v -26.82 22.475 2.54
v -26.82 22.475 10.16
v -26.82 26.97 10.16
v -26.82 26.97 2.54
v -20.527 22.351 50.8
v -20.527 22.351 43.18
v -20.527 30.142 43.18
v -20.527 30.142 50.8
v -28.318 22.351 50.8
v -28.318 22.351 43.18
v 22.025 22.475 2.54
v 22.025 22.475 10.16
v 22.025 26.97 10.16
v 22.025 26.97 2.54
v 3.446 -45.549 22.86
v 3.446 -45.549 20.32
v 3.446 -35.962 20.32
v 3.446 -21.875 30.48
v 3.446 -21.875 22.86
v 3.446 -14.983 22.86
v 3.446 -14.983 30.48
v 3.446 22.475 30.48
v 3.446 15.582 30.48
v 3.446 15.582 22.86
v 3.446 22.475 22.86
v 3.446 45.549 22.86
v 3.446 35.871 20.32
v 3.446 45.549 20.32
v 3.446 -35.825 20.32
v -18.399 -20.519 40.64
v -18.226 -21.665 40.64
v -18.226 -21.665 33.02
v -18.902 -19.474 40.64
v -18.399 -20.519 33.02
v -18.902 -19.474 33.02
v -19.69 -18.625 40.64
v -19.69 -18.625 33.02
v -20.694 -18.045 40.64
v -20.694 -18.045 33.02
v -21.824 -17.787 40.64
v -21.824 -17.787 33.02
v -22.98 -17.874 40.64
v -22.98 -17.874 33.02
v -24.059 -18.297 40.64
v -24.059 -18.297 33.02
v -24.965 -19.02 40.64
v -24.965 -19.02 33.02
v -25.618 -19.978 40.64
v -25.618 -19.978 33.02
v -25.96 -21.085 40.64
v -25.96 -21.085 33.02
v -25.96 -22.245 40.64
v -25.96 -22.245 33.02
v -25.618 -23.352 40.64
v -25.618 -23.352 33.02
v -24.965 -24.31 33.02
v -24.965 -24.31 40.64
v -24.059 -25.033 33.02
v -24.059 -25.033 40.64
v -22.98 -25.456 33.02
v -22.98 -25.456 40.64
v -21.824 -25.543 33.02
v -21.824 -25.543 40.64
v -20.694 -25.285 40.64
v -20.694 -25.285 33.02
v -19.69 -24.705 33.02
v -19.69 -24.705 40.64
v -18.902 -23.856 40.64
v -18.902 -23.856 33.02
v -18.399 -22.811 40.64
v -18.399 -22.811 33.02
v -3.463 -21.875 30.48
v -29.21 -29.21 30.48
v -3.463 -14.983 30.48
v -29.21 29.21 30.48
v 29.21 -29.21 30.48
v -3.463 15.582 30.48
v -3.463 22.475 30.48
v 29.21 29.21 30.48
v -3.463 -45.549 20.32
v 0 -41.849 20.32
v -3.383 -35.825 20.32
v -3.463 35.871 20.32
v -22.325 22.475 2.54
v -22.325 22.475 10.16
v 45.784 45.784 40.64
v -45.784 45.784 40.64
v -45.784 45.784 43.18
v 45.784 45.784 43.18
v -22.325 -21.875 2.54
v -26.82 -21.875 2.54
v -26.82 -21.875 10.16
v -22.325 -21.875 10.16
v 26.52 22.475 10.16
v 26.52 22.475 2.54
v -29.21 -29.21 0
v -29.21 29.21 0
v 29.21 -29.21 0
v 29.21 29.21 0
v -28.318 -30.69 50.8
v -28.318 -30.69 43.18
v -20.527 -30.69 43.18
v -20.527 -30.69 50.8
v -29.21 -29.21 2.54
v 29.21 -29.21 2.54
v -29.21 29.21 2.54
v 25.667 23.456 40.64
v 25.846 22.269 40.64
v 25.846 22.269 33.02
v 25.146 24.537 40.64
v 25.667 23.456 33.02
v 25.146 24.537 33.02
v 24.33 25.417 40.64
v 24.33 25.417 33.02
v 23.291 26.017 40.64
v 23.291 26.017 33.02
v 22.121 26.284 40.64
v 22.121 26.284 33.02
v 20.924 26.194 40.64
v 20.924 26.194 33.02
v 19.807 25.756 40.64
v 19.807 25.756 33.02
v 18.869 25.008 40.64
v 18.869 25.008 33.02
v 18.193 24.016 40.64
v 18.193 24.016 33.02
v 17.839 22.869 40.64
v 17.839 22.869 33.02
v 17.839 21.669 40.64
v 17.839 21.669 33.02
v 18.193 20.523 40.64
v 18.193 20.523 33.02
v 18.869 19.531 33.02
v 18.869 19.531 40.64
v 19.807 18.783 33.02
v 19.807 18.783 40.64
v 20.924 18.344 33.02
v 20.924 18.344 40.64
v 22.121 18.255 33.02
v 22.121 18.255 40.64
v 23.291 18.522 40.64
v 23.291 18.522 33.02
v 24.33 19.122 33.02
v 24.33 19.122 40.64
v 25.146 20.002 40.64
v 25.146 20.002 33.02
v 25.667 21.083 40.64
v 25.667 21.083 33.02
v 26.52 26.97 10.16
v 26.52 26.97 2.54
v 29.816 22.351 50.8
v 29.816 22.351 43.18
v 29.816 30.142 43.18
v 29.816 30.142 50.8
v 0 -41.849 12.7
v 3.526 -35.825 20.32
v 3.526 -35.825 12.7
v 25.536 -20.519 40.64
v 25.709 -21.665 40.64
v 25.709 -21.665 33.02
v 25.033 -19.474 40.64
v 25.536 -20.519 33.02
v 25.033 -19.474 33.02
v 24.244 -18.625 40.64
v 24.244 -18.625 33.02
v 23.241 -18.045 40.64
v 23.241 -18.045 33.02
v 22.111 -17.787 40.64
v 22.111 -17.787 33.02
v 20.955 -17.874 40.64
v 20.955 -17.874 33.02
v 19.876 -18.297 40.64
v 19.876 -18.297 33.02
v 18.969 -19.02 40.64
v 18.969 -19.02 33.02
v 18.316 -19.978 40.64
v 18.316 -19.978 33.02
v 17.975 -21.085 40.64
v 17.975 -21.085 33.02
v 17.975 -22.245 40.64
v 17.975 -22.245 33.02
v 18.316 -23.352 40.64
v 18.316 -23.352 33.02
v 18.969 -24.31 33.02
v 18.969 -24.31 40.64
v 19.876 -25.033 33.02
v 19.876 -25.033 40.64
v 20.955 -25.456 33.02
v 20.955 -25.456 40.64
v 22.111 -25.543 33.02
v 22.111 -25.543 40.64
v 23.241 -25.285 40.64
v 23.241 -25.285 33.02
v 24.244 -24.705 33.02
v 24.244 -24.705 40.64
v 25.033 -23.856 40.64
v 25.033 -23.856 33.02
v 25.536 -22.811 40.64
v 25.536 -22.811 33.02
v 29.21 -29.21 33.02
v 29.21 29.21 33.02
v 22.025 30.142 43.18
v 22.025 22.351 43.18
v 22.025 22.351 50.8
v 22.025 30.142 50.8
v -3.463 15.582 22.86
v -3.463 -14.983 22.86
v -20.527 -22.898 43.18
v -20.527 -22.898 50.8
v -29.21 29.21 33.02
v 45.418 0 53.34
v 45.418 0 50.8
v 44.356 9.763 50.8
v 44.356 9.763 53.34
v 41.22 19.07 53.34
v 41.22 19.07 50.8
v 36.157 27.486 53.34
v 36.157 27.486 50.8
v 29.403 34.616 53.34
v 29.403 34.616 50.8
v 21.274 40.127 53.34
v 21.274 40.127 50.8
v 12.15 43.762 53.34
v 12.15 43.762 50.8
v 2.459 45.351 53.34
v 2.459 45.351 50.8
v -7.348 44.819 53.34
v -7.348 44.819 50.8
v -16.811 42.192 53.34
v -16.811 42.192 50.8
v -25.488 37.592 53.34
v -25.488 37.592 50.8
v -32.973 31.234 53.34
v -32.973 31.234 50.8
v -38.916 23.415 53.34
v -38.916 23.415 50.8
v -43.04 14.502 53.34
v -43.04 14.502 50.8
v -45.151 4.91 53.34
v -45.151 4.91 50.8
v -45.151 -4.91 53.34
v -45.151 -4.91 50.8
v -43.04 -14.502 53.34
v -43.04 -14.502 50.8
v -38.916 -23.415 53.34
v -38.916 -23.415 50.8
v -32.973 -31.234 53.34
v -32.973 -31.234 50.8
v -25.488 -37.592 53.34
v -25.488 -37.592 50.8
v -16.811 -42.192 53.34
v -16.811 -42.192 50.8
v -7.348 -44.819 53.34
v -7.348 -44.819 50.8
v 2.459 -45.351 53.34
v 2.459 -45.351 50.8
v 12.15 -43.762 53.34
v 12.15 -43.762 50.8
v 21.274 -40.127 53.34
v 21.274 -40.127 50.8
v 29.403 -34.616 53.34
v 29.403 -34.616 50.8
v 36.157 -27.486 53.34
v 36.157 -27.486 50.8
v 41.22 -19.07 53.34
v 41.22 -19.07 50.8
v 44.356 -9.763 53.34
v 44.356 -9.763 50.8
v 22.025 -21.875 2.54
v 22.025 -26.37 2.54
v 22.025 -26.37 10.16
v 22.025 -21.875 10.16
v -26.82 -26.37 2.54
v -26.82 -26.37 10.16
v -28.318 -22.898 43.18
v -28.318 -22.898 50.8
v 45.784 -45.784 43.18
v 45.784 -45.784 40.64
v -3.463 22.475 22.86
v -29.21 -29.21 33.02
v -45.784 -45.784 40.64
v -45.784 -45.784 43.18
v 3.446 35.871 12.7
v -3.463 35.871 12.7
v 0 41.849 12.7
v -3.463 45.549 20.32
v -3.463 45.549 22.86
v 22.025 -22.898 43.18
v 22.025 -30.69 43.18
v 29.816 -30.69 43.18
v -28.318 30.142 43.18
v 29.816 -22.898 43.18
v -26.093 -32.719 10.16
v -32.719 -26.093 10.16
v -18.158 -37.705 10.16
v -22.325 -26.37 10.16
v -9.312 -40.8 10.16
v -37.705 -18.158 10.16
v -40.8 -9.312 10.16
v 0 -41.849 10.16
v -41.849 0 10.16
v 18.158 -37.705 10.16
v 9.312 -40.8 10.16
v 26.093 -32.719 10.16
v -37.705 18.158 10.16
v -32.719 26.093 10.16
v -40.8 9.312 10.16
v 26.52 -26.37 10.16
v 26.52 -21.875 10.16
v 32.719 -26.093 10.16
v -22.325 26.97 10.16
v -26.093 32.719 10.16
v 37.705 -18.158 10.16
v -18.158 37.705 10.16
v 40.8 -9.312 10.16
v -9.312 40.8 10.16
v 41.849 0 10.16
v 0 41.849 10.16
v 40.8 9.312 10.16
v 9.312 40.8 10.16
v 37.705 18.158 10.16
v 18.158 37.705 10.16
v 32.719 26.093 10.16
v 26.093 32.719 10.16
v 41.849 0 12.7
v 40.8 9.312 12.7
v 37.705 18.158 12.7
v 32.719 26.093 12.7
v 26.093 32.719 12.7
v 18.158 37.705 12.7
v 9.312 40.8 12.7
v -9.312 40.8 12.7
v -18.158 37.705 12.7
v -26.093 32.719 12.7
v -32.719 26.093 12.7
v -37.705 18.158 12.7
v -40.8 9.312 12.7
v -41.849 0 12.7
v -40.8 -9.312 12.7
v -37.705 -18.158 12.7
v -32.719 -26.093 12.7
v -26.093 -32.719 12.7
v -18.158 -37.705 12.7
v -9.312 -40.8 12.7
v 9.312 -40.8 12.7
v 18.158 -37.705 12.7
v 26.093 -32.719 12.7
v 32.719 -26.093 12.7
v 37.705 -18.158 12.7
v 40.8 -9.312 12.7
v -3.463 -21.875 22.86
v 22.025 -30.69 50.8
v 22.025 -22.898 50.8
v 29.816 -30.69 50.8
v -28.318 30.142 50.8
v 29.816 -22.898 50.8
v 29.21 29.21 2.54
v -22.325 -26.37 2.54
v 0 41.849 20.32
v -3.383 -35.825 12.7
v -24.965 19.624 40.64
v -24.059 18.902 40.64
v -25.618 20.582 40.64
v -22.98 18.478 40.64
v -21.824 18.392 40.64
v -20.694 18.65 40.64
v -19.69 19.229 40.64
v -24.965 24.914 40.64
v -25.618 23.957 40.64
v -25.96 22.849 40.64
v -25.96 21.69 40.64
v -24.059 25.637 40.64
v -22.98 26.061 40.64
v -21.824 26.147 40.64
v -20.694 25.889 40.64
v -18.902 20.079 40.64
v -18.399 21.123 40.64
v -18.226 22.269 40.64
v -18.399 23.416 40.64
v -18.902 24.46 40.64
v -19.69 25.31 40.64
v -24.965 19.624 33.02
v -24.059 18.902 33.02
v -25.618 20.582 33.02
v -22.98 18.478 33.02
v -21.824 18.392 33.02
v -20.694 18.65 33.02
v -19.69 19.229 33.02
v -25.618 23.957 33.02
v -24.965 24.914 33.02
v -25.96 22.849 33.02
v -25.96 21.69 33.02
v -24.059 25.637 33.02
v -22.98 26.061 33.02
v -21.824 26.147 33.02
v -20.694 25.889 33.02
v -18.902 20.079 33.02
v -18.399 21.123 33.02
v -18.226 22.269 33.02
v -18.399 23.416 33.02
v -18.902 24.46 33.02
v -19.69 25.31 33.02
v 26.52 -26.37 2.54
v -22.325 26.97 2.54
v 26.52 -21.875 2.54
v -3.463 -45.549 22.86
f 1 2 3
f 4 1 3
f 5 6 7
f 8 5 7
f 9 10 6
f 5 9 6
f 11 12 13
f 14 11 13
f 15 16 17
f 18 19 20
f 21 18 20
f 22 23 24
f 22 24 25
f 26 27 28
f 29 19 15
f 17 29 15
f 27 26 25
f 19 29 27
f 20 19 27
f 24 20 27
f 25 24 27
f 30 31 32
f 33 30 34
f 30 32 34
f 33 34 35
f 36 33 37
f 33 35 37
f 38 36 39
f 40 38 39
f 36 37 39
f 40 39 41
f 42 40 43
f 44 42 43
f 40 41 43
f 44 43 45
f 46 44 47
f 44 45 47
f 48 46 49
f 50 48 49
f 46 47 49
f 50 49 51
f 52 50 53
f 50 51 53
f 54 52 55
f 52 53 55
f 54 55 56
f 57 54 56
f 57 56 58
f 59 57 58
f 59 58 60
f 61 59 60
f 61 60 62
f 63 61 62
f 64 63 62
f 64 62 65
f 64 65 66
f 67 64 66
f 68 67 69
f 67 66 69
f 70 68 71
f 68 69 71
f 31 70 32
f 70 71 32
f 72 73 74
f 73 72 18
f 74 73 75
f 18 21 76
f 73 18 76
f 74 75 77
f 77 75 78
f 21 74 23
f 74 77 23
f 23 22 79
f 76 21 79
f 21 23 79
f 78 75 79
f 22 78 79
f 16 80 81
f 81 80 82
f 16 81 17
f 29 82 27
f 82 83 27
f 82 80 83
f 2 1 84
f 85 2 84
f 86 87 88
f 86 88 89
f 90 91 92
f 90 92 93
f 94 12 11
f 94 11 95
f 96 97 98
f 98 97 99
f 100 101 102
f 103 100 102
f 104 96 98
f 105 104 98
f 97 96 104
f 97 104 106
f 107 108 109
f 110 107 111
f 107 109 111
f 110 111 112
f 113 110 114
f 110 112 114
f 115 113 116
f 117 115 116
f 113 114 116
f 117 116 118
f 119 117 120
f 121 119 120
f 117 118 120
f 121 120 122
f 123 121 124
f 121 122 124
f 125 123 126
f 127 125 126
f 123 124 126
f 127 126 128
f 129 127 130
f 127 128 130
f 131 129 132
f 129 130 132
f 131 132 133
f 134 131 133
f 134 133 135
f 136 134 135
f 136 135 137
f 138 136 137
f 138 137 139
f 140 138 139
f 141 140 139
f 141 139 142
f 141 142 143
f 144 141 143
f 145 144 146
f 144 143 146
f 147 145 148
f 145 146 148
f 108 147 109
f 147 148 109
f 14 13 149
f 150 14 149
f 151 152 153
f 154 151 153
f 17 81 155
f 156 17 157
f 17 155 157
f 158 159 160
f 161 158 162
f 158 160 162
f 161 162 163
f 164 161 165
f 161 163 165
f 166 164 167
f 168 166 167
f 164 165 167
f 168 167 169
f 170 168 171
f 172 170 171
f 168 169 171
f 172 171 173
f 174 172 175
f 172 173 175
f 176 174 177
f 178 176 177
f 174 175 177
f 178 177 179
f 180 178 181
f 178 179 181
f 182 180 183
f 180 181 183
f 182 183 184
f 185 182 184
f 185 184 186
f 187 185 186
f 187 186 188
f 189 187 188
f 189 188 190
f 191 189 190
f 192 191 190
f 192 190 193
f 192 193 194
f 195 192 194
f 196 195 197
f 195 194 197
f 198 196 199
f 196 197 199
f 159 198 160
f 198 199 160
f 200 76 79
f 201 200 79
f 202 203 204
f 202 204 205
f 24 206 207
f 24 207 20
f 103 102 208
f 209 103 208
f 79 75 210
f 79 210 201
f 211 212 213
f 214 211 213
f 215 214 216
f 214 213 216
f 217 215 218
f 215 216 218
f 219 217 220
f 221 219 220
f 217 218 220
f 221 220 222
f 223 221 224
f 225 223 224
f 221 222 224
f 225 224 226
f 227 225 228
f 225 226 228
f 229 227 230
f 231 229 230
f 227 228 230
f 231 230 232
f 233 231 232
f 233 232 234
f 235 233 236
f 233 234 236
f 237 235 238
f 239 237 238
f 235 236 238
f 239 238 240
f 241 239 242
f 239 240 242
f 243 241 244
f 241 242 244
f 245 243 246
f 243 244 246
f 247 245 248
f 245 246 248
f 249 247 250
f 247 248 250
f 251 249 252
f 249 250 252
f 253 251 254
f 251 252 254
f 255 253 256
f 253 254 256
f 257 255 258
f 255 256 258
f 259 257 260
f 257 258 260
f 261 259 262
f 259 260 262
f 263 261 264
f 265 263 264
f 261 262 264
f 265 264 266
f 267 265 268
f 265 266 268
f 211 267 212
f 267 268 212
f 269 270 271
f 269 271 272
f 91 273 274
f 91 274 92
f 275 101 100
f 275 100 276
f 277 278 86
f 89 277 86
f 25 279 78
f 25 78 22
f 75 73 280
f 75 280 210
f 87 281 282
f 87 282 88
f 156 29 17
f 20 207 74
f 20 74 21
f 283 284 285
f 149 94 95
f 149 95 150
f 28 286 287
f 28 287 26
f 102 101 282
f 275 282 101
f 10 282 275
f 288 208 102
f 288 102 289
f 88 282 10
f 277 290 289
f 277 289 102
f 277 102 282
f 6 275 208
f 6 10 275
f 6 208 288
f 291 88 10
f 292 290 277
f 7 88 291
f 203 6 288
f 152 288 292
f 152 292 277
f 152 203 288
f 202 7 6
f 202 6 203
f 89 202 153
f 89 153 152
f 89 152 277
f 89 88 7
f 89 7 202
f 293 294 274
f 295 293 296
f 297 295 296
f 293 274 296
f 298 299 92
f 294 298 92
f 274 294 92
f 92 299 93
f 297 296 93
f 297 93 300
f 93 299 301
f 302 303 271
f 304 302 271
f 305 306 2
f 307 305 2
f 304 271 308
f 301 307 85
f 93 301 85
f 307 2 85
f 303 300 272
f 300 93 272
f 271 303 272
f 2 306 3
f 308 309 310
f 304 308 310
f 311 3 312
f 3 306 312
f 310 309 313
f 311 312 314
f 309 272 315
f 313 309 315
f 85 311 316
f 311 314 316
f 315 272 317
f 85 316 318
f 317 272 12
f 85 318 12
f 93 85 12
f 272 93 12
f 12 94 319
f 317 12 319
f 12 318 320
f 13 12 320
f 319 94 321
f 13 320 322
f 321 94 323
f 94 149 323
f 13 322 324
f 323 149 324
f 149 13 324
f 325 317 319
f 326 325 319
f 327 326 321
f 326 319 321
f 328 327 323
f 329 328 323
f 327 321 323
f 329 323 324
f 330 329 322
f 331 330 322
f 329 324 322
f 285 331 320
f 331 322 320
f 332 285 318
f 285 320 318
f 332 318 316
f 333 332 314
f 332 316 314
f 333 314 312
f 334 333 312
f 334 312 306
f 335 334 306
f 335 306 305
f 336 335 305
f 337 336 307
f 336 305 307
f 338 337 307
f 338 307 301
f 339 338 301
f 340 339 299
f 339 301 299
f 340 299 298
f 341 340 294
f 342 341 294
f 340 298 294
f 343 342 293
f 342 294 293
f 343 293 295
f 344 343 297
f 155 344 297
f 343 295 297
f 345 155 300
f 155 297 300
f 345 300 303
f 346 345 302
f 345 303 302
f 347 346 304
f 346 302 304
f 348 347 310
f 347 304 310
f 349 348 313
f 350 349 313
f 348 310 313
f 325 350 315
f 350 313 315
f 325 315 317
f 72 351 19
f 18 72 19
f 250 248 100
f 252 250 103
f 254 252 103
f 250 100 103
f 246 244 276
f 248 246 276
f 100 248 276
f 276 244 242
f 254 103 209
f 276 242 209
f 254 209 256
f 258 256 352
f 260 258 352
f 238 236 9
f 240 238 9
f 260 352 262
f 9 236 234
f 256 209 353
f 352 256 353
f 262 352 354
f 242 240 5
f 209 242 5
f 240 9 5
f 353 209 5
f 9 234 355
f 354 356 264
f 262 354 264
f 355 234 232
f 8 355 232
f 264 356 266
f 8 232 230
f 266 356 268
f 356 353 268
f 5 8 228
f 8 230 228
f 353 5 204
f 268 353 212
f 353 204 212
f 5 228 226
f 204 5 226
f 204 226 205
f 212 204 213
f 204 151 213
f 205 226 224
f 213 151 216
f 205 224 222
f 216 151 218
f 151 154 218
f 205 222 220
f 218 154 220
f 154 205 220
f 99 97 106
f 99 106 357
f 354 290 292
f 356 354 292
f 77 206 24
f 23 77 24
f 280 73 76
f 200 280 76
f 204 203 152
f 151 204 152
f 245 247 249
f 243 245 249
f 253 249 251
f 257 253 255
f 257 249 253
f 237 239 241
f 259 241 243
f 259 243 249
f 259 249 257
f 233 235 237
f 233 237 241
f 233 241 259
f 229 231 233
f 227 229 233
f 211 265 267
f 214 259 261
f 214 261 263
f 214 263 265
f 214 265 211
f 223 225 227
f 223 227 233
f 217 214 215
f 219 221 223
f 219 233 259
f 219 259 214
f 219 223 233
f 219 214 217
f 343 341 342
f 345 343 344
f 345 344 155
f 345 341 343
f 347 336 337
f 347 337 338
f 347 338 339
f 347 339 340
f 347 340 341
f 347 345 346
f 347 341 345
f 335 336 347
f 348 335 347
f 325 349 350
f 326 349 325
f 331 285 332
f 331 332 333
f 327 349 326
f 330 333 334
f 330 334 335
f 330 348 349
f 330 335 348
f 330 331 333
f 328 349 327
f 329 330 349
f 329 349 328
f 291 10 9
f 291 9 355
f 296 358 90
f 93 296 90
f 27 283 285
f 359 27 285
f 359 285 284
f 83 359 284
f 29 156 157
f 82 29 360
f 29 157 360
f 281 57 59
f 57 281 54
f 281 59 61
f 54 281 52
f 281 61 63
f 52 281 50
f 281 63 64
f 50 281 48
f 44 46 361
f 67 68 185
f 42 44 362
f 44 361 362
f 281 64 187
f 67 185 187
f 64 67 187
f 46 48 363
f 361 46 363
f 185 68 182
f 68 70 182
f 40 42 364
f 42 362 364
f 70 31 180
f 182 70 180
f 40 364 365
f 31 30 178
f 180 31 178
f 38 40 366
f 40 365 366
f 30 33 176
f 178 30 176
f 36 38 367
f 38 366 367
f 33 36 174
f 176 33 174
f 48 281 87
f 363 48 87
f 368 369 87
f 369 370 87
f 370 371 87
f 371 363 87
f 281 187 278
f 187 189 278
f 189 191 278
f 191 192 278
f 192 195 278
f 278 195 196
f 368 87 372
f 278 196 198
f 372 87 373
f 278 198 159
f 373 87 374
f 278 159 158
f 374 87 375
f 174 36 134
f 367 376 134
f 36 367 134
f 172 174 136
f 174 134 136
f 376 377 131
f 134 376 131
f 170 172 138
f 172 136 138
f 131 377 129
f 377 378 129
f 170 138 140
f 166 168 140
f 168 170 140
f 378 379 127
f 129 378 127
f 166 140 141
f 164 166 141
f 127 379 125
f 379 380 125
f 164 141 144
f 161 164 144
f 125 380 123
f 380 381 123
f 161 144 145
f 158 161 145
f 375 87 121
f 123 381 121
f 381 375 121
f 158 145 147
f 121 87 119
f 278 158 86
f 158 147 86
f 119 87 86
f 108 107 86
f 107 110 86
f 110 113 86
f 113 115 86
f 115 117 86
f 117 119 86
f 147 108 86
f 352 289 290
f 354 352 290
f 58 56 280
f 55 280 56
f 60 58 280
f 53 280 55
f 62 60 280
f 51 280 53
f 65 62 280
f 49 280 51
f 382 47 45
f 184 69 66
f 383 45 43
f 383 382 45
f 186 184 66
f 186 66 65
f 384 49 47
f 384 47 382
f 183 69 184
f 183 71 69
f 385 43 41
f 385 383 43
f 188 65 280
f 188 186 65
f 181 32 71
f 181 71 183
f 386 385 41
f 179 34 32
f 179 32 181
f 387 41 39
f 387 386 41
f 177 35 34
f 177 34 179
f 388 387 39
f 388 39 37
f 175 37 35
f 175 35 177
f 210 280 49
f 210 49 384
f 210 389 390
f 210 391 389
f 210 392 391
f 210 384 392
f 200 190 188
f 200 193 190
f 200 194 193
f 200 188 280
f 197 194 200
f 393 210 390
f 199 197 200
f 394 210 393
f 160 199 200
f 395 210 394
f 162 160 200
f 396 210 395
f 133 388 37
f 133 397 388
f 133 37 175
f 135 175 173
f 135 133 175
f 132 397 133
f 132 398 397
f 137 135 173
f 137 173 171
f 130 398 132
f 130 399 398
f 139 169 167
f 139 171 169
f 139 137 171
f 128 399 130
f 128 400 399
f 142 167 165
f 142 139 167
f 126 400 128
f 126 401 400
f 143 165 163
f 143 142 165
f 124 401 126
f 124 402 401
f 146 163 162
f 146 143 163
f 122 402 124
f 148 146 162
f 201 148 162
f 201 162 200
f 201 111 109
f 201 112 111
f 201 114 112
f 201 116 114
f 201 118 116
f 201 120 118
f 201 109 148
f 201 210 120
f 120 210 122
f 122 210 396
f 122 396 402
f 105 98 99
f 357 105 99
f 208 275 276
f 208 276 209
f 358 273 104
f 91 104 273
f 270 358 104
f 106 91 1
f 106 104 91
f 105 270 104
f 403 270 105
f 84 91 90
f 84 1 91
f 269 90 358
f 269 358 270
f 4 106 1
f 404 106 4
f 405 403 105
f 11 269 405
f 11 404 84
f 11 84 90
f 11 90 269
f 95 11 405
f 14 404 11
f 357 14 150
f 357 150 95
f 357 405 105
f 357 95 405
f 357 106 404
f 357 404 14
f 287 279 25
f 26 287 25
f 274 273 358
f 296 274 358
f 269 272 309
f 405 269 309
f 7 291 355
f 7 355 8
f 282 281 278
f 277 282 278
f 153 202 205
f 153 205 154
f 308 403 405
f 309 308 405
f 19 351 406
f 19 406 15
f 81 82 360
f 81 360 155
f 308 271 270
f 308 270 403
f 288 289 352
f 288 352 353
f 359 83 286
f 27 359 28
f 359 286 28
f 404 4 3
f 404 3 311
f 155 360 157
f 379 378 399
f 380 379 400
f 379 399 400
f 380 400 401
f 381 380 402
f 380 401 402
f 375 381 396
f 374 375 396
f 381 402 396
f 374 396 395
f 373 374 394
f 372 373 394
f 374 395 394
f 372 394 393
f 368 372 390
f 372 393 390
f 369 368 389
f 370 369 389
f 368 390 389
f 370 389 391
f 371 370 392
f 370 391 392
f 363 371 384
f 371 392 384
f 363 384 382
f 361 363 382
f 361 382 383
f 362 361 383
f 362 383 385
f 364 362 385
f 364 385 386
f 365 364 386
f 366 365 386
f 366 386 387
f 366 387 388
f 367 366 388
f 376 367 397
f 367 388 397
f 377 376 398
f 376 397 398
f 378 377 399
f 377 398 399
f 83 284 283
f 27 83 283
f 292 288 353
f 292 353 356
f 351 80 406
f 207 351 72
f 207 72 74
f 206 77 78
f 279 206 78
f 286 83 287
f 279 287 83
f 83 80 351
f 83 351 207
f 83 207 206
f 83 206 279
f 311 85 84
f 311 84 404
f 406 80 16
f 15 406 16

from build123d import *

# Parameters (mm, degrees)
F0_W      = 58.42
F0_H      = 58.42
F1_DEPTH  = 2.54
F2_W      = 4.4949427247
F2_H      = 4.4949445873
F3_DEPTH  = 7.62
F4_W      = 4.4949445873
F4_H      = 4.4949445873
F5_DEPTH  = 7.62
F6_W      = 4.4949427247
F6_H      = 4.49494645
F7_DEPTH  = 7.62
F8_W      = 4.4949445873
F8_H      = 4.49494645
F9_DEPTH  = 7.62
F10_R     = 41.8491374304
F11_DEPTH = 2.54
F13_DEPTH = 7.62
F15_DEPTH = 7.62
F16_W     = 6.9088
F16_H     = 91.0975262523
F17_DEPTH = 2.54
F18_W     = 6.9088
F18_H     = 6.8922471255
F19_DEPTH = 7.62
F20_W     = 6.9088
F20_H     = 6.8922471255
F21_DEPTH = 7.62
F22_W     = 58.42
F22_H     = 58.42
F23_DEPTH = 2.54
F24_R     = 3.8886710073
F24_R_2   = 3.8886723427
F24_R_3   = 3.8886735446
F24_R_4   = 4.0259
F25_DEPTH = 7.62
F26_W     = 91.567
F26_H     = 91.567
F27_DEPTH = 2.54
F28_W     = 7.791236043
F28_H     = 7.791236043
F28_W_2   = 7.7912285924
F28_W_3   = 7.7912434936
F28_H_2   = 7.7912397683
F29_DEPTH = 7.62
F30_R     = 45.4175170009
F31_DEPTH = 2.54


with BuildPart() as f1:
    # F0 (on Top) → F1 (new body)
    with BuildSketch(Plane.XY):
        Rectangle(F0_W, F0_H)
    extrude(amount=F1_DEPTH)

    # F2 (on face) → F3 (join)
    with BuildSketch(Plane.XY.offset(2.54)):
        with Locations((-24.572359398, 24.7221915051)):
            Rectangle(F2_W, F2_H)
    extrude(amount=F3_DEPTH)

    # F4 (on face) → F5 (join)
    with BuildSketch(Plane.XY.offset(2.54)):
        with Locations((24.2726961151, 24.7221915051)):
            Rectangle(F4_W, F4_H)
    extrude(amount=F5_DEPTH)

    # F6 (on face) → F7 (join)
    with BuildSketch(Plane.XY.offset(2.54)):
        with Locations((-24.572359398, -24.1228658706)):
            Rectangle(F6_W, F6_H)
    extrude(amount=F7_DEPTH)

    # F8 (on face) → F9 (join)
    with BuildSketch(Plane.XY.offset(2.54)):
        with Locations((24.2726961151, -24.1228658706)):
            Rectangle(F8_W, F8_H)
    extrude(amount=F9_DEPTH)

    # F10 (on face) → F11 (join)
    with BuildSketch(Plane.XY.offset(10.16)):
        Circle(F10_R)
    extrude(amount=F11_DEPTH)


with BuildPart() as f13:
    # F12 (on face) → F13 (new body)
    with BuildSketch(Plane.XY.offset(12.7)):
        Polygon((3.445815184, 35.8709057852), (0, 41.8491374304), (-3.462984816, 35.8709057852), align=None)
    extrude(amount=F13_DEPTH)



with BuildPart() as f15:
    # F14 (on face) → F15 (new body)
    with BuildSketch(Plane.XY.offset(12.7)):
        Polygon((-3.3829984536, -35.8252816135), (0, -41.8491374304), (3.5258015464, -35.8252816135), align=None)
    extrude(amount=F15_DEPTH)


with BuildPart() as f13_1:
    add(f13.part)

    add(f15.part)  # F17 merges F15
    # F16 (on face) → F17 (join)
    with BuildSketch(Plane.XY.offset(20.32)):
        with Locations((-0.008584816, 0)):
            Rectangle(F16_W, F16_H)
    extrude(amount=F17_DEPTH)

    # F18 (on face) → F19 (join)
    with BuildSketch(Plane.XY.offset(22.86)):
        with Locations((-0.008584816, 19.0285956487)):
            Rectangle(F18_W, F18_H)
    extrude(amount=F19_DEPTH)

    # F20 (on face) → F21 (join)
    with BuildSketch(Plane.XY.offset(22.86)):
        with Locations((-0.008584816, -18.4292690828)):
            Rectangle(F20_W, F20_H)
    extrude(amount=F21_DEPTH)

    # F22 (on face) → F23 (join)
    with BuildSketch(Plane.XY.offset(30.48)):
        Rectangle(F22_W, F22_H)
    extrude(amount=F23_DEPTH)

    # F24 (on face) → F25 (join)
    with BuildSketch(Plane.XY.offset(33.02)):
        with Locations((-22.114558397, 22.2694298633)):
            Circle(F24_R)
        with Locations((-22.114558397, -21.665063095)):
            Circle(F24_R_2)
        with Locations((21.8199381546, -21.665063095)):
            Circle(F24_R_3)
        with Locations((21.8199381546, 22.2694298633)):
            Circle(F24_R_4)
    extrude(amount=F25_DEPTH)

    # F26 (on face) → F27 (join)
    with BuildSketch(Plane.XY.offset(40.64)):
        Rectangle(F26_W, F26_H)
    extrude(amount=F27_DEPTH)

    # F28 (on face) → F29 (join)
    with BuildSketch(Plane.XY.offset(43.18)):
        with Locations((-24.4225282222, 26.2462347746)):
            Rectangle(F28_W, F28_H)
        with Locations((25.9208455682, 26.2462347746)):
            Rectangle(F28_W_2, F28_H)
        with Locations((25.9208455682, -26.7941039056)):
            Rectangle(F28_W_3, F28_H)
        with Locations((-24.4225282222, -26.7941039056)):
            Rectangle(F28_W, F28_H_2)
    extrude(amount=F29_DEPTH)

    # F30 (on face) → F31 (join)
    with BuildSketch(Plane.XY.offset(50.8)):
        Circle(F30_R)
    extrude(amount=F31_DEPTH)


solid = Compound([f1.part, f13_1.part])
